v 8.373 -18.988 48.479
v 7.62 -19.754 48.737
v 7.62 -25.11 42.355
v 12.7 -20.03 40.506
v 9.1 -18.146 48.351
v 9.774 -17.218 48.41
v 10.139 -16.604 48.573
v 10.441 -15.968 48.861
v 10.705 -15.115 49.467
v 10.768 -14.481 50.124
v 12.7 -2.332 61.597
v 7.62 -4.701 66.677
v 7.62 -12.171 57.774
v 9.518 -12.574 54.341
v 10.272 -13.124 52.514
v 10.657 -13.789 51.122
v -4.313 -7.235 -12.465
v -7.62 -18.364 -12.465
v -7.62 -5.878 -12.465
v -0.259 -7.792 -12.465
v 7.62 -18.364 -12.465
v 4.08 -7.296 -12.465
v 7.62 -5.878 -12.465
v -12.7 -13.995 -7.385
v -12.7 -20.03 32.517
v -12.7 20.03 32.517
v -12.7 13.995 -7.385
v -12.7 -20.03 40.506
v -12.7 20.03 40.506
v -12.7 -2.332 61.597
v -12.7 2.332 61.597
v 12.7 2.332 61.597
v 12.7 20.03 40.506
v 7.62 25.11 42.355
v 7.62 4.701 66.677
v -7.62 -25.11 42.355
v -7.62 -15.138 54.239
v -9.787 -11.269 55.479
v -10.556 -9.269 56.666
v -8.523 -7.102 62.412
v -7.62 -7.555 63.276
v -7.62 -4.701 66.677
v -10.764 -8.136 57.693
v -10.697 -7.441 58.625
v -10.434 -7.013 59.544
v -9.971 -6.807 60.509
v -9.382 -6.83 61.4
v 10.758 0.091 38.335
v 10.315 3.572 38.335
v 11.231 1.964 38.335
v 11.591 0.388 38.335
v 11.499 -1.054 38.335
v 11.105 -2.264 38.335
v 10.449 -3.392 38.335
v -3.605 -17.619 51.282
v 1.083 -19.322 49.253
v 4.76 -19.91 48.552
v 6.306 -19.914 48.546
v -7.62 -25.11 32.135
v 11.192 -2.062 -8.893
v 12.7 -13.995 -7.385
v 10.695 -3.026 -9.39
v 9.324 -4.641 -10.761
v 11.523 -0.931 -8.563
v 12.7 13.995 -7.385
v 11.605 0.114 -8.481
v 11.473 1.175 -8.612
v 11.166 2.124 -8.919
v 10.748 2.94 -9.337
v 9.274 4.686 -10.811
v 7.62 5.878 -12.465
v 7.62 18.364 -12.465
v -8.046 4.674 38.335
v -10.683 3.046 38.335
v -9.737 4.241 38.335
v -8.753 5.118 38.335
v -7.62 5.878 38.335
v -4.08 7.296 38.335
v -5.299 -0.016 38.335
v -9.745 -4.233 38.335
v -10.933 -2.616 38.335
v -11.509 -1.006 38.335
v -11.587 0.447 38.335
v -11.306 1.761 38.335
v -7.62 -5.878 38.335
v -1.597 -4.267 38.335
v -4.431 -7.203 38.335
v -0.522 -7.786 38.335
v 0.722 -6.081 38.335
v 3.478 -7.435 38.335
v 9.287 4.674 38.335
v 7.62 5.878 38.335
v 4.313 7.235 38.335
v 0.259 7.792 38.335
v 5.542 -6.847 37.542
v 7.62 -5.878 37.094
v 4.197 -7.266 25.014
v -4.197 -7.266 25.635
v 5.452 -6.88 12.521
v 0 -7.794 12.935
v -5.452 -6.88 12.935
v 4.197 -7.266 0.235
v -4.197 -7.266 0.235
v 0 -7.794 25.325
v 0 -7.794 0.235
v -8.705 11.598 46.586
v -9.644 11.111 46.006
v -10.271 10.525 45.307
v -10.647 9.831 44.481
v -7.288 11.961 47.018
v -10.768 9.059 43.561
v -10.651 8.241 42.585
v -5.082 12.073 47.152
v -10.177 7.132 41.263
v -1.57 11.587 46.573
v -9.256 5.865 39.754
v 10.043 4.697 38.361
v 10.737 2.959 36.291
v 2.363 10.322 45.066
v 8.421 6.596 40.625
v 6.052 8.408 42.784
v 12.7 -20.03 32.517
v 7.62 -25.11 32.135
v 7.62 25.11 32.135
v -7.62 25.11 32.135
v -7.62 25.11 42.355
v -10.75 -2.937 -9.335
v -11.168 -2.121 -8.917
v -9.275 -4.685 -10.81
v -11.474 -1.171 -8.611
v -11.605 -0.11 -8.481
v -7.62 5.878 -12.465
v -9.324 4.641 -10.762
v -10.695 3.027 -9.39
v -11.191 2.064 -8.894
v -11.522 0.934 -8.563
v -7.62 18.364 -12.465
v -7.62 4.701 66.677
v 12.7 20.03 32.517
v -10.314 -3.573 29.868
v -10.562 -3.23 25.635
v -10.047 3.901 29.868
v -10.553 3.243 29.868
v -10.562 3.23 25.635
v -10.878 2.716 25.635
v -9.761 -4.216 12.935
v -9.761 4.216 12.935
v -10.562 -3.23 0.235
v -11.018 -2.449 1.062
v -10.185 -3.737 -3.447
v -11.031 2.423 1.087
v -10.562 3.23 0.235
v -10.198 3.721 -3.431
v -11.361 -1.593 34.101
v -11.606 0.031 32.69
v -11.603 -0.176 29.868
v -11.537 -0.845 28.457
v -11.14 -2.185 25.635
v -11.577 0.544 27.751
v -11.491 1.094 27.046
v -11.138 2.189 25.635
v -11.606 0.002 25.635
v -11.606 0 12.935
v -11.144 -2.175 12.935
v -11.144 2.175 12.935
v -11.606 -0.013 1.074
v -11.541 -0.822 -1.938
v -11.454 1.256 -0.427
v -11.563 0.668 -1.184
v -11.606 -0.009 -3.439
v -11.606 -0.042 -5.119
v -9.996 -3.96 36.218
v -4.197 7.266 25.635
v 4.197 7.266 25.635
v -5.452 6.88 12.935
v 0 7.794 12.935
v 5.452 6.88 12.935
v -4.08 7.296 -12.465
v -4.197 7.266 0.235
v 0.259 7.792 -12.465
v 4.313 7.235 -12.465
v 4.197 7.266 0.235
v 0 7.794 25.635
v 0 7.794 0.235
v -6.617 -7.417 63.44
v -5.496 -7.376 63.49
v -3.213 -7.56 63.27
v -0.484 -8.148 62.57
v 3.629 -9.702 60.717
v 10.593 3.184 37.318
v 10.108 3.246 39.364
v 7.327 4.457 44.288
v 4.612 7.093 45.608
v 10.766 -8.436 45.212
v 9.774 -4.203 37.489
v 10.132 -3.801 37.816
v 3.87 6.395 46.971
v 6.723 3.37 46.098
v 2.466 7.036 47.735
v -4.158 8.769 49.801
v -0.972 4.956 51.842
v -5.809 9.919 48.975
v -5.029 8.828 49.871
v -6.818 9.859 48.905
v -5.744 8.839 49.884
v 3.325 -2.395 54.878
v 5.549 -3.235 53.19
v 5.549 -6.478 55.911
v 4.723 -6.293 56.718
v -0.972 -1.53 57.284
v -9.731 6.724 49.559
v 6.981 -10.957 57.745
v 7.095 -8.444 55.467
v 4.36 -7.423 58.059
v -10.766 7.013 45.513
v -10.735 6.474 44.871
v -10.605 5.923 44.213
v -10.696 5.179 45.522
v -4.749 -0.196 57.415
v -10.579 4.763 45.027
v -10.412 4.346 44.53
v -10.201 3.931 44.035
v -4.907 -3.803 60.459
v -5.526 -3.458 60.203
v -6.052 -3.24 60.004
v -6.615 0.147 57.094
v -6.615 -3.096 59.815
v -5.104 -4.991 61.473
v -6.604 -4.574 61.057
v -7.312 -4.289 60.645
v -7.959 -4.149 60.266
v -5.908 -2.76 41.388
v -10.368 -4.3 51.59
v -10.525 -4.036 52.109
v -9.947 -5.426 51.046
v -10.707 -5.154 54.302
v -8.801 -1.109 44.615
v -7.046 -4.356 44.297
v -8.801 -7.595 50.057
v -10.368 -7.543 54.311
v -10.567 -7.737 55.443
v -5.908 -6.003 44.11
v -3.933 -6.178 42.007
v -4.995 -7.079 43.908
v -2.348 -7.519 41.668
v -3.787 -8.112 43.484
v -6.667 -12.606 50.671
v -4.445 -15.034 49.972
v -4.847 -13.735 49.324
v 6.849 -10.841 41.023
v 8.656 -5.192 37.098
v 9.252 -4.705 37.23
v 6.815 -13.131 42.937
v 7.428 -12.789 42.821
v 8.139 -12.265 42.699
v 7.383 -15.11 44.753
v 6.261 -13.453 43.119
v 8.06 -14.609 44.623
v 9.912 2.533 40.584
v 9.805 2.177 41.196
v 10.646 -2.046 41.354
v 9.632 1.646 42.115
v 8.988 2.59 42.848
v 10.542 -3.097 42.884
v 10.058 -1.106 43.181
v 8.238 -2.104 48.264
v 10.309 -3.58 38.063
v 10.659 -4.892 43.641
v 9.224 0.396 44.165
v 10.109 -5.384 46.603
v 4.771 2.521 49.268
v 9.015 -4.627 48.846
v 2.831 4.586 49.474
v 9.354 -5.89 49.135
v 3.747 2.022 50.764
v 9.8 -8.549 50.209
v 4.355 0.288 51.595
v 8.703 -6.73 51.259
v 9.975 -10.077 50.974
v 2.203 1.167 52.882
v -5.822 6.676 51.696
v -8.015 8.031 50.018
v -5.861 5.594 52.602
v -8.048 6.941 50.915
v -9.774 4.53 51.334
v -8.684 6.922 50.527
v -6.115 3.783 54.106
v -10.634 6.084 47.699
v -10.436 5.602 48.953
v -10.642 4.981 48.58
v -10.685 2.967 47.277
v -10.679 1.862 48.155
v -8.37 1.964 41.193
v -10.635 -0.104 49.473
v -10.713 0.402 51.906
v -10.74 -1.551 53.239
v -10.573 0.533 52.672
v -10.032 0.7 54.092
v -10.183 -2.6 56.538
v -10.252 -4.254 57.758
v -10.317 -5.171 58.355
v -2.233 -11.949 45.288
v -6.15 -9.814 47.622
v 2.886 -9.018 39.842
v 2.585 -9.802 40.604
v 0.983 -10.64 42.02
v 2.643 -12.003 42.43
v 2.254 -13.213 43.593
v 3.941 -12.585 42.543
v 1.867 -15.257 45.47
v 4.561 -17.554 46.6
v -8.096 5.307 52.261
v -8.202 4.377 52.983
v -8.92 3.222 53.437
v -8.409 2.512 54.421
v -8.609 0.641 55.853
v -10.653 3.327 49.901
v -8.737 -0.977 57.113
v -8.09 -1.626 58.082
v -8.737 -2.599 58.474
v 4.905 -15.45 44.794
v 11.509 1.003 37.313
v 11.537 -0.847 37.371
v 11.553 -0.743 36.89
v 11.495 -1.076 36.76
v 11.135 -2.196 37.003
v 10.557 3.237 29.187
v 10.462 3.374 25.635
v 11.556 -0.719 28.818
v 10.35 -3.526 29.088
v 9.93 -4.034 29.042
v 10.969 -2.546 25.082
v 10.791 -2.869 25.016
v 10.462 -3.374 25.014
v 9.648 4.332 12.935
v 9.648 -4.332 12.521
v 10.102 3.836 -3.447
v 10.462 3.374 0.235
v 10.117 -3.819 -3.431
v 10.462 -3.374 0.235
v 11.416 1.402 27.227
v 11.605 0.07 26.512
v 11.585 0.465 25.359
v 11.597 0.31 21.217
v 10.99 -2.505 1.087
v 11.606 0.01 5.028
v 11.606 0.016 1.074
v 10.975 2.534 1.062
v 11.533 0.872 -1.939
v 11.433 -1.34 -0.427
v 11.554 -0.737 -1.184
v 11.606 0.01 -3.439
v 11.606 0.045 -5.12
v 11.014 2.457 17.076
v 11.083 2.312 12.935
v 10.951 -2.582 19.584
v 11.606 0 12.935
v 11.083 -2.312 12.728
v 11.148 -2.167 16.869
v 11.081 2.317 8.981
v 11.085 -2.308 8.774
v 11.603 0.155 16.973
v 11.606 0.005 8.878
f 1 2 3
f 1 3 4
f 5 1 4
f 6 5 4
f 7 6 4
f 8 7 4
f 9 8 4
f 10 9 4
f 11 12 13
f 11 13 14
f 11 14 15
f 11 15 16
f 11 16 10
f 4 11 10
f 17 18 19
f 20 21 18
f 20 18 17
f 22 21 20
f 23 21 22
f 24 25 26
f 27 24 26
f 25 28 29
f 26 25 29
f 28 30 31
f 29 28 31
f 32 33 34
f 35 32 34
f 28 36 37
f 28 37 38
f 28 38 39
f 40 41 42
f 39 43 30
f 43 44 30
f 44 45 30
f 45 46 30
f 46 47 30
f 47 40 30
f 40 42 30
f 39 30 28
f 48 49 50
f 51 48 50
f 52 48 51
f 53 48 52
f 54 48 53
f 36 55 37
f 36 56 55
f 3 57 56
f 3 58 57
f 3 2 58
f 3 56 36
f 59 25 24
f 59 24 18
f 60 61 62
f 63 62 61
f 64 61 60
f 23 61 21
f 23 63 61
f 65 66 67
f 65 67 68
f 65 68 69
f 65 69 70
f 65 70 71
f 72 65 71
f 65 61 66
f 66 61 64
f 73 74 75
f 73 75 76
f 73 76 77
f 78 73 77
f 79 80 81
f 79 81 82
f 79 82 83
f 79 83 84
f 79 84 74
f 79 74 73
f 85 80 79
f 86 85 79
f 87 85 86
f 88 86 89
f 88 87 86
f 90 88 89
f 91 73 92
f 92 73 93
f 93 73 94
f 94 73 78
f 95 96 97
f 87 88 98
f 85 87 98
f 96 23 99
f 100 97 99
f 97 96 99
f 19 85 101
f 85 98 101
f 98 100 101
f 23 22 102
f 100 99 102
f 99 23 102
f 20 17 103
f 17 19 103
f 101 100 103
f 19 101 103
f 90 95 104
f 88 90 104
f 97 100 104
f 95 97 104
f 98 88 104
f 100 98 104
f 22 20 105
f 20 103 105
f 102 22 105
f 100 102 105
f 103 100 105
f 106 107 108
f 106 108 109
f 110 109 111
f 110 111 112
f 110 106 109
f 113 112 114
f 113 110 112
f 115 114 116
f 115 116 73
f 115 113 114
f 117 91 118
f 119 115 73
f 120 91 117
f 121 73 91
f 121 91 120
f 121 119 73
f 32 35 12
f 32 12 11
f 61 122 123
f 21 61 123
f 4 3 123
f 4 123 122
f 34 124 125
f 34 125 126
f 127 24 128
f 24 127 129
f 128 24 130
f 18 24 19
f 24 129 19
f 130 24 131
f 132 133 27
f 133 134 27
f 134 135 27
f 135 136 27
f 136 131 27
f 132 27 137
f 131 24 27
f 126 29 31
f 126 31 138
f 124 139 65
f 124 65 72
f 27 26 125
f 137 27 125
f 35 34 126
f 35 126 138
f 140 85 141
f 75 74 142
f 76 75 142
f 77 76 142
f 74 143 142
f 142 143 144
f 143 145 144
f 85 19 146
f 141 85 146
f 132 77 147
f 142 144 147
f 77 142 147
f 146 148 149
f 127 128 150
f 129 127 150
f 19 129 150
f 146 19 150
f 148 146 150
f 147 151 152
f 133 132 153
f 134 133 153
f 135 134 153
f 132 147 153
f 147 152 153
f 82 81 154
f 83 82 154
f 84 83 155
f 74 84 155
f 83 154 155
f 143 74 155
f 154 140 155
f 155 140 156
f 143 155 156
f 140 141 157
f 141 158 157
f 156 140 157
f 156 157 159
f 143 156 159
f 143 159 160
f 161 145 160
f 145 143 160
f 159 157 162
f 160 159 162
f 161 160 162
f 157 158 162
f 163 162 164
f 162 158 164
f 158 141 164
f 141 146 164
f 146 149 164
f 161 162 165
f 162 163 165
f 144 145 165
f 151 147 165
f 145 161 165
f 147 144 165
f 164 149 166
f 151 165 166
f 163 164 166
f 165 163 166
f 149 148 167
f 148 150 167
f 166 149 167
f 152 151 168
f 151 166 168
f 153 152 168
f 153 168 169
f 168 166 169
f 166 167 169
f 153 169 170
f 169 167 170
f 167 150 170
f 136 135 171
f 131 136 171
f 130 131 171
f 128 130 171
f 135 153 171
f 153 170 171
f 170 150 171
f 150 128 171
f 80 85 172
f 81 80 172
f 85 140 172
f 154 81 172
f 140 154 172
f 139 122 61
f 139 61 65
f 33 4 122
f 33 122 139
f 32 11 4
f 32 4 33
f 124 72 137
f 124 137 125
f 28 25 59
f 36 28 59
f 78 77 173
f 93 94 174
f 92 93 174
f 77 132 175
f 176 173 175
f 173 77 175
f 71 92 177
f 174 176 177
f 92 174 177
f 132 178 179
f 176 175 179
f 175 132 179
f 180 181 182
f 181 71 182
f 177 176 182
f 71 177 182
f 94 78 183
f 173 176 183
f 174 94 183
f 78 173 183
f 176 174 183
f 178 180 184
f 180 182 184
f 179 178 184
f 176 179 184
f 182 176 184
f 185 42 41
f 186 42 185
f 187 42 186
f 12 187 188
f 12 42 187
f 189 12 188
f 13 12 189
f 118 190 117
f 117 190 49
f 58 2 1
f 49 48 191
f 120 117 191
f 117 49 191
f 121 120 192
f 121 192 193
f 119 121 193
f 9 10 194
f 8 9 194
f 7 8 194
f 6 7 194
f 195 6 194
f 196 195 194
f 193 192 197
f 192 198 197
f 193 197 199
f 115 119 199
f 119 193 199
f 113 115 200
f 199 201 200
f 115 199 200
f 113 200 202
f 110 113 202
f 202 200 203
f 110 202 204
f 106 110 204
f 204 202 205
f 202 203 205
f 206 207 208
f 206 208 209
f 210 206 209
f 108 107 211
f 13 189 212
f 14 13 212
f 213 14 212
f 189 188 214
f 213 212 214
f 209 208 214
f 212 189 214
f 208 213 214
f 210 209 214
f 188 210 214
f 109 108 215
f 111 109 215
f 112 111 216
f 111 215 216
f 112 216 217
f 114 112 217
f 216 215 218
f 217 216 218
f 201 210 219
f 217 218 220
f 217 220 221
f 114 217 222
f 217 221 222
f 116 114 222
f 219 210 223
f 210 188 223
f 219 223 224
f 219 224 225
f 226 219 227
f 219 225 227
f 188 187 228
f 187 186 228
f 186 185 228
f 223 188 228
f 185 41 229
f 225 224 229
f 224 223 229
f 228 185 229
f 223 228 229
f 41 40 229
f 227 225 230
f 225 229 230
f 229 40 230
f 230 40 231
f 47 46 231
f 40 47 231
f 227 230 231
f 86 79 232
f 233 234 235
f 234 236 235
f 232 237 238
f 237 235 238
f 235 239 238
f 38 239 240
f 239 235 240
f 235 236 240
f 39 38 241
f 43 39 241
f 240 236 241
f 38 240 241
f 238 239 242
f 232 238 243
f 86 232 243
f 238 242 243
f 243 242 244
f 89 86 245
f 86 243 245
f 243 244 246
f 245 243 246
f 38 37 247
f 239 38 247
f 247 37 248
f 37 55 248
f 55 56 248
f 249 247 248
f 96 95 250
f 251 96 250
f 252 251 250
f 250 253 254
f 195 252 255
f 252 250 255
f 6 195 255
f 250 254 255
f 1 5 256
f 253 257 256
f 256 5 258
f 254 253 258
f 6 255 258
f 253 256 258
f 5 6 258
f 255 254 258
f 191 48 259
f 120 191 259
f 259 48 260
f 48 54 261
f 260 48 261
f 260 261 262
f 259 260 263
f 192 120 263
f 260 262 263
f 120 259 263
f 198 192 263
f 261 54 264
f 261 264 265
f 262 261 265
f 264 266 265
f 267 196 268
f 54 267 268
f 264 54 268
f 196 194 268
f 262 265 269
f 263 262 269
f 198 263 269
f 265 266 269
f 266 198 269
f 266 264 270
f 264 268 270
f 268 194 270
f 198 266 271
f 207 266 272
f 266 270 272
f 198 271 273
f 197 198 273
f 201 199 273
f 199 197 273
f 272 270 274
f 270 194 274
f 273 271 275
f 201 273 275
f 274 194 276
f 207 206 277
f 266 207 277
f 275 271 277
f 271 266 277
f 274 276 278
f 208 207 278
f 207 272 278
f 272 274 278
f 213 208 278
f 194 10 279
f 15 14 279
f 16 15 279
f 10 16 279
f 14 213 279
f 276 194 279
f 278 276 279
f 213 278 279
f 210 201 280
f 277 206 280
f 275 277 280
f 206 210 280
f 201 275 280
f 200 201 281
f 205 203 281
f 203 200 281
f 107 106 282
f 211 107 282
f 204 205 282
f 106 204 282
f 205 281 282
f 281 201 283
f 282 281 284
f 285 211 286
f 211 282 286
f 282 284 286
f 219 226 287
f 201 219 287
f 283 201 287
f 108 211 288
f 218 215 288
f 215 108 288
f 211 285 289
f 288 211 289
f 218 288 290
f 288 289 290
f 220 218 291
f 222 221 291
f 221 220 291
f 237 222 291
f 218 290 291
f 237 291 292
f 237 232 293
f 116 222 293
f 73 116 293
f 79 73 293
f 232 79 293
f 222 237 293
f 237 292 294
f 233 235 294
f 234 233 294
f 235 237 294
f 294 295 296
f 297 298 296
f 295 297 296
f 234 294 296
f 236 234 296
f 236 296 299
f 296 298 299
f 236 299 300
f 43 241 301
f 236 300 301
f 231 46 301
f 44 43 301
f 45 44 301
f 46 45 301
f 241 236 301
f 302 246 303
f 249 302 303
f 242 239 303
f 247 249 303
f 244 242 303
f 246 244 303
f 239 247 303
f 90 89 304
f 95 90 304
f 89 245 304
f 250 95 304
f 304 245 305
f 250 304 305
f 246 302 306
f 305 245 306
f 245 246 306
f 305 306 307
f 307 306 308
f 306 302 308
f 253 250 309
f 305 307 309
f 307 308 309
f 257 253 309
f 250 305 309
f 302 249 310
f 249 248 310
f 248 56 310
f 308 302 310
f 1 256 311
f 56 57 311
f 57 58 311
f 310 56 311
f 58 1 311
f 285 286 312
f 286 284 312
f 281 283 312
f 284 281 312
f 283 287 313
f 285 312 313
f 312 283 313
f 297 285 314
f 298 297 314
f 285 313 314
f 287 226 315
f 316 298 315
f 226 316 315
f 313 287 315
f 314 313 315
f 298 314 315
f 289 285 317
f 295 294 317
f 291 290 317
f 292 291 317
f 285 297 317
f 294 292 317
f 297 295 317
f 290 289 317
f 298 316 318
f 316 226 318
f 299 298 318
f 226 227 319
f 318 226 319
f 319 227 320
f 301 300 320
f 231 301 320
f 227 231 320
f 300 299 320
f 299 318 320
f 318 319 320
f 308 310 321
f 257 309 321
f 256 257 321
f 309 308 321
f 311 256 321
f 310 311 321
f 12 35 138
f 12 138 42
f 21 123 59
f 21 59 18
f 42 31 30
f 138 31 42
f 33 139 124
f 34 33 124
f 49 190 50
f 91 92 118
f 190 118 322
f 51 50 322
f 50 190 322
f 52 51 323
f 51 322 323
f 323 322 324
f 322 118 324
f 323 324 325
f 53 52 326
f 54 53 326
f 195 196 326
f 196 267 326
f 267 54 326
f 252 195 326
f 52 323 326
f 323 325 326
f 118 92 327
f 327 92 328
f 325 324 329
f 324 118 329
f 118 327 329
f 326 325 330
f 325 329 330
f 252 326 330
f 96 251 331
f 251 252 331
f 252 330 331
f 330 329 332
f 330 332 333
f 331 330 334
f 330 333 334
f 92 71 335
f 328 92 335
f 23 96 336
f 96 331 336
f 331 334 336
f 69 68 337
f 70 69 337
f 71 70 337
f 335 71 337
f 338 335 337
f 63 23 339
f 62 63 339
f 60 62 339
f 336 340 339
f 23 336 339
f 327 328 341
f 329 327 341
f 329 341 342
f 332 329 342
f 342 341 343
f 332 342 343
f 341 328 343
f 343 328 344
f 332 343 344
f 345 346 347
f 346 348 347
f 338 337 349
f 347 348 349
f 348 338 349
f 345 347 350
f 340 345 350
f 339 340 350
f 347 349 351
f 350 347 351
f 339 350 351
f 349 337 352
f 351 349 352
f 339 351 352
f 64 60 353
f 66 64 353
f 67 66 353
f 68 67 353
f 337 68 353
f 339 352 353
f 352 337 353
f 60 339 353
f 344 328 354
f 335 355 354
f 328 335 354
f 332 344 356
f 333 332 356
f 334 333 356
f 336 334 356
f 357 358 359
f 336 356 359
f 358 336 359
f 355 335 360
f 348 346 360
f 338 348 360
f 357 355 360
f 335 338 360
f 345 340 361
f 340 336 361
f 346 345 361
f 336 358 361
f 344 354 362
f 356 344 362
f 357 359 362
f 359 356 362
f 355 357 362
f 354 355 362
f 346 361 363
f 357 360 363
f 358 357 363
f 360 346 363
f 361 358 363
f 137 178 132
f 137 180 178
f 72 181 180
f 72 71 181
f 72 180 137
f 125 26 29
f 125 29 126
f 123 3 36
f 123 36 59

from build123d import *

# Parameters (mm, degrees)
F1_DEPTH     = 12.7
F3_DEPTH     = 25.4
F4_T1_DEPTH  = 57.8782991577
F4_T3_DEPTH  = 62.476485972
F4_T5_DEPTH  = 97.3641990785
F4_T7_DEPTH  = 35.5309018222
F4_T9_DEPTH  = 57.8782991577
F4_T11_DEPTH = 97.3641990785
F4_T13_DEPTH = 62.8567289608
F6_DEPTH     = 50.8


# Not quite as in the source:
# - a fillet or chamfer that OpenCascade refuses, or shapes differently, is made with other operations: its cross-section is extruded or revolved along the edge and cut away or added


with BuildPart() as f1:
    # F0 (on Right) → F1 (new body, symmetric)
    with BuildSketch(Plane.YZ):
        Polygon((-4.7013013323, 66.6768401792), (-25.1098079398, 42.3549291102), (-25.1098079398, 32.1350414537), (-18.3642149015, -12.4653242528), (0, -12.4653242528), (18.3642149015, -12.4653242528), (25.1098079398, 32.1350414537), (25.1098079398, 42.3549291102), (4.7013013323, 66.6768401792), (0, 66.6768401792), align=None)
    extrude(amount=F1_DEPTH, both=True)

    # F2 (on face) → F3 (cut)
    with BuildSketch(Plane(origin=(0, -35.5907714481, 29.8642031954), x_dir=(1, 0, 0), z_dir=(0, -0.7660444431, 0.6427876097))):
        with BuildLine():
            add(Edge.make_bspline(
                [(9.7735087186, 26.016607844), (17.6021152344, 35.4512603932), (-0.9724511014, 42.8986037189), (-19.5470174373, 50.3459470446), (-8.8010576172, 33.4639511697), (1.9449022029, 16.5819552948), (9.7735087186, 26.016607844)],
                knots=[0, 0, 0, 2.0943951024, 2.0943951024, 4.1887902048, 4.1887902048, 6.2831853072, 6.2831853072, 6.2831853072], degree=2, weights=[1, 0.5, 1, 0.5, 1, 0.5, 1]))
        make_face()
    extrude(amount=-F3_DEPTH, mode=Mode.SUBTRACT)

    # F4: chamfer of 5.08 on 16 edges, made by hand

    # F4_s2 → F4_t1 (cut)
    with BuildSketch(Plane(origin=(0, 39.2869435962, 46.8203561728), x_dir=(1, 0, 0), z_dir=(0, -0.6427876097, -0.7660444431))):
        Polygon((7.62, 46.4604524813), (12.7, 41.3804524813), (12.7, 46.4604524813), align=None)
        Polygon((-7.62, 46.4604524813), (-12.7, 41.3804524813), (-12.7, 46.4604524813), align=None)
    extrude(amount=F4_T1_DEPTH, mode=Mode.SUBTRACT)

    # F4_s4 → F4_t3 (cut)
    with BuildSketch(Plane.XY.offset(-7.0574072829)):
        Polygon((7.62, -25.1098079398), (12.7, -20.0298079398), (12.7, -25.1098079398), align=None)
        Polygon((12.7, 20.0298079398), (7.62, 25.1098079398), (12.7, 25.1098079398), align=None)
        Polygon((-12.7, 20.0298079398), (-7.62, 25.1098079398), (-12.7, 25.1098079398), align=None)
        Polygon((-12.7, -20.0298079398), (-7.62, -25.1098079398), (-12.7, -25.1098079398), align=None)
    extrude(amount=F4_T3_DEPTH, mode=Mode.SUBTRACT)

    # F4_s6 → F4_t5 (cut)
    with BuildSketch(Plane(origin=(0, -11.1741383172, 73.8809253053), x_dir=(1, 0, 0), z_dir=(0, 0.1495444875, -0.9887549981))):
        Polygon((12.7, 14.9418297969), (7.62, 20.0218297969), (12.7, 20.0218297969), align=None)
        Polygon((-12.7, 14.9418297969), (-7.62, 20.0218297969), (-12.7, 20.0218297969), align=None)
    extrude(amount=F4_T5_DEPTH, mode=Mode.SUBTRACT)

    # F4_s8 → F4_t7 (cut)
    with BuildSketch(Plane.XZ.offset(-17.7654509111)):
        Polygon((7.62, 66.6768401792), (12.7, 61.5968401792), (12.7, 66.6768401792), align=None)
        Polygon((-12.7, 61.5968401792), (-7.62, 66.6768401792), (-12.7, 66.6768401792), align=None)
    extrude(amount=F4_T7_DEPTH, mode=Mode.SUBTRACT)

    # F4_s10 → F4_t9 (cut)
    with BuildSketch(Plane(origin=(0, -2.0834900279, 2.4830067258), x_dir=(1, 0, 0), z_dir=(0, -0.6427876097, 0.7660444431))):
        Polygon((12.7, 41.3804524813), (7.62, 46.4604524813), (12.7, 46.4604524813), align=None)
        Polygon((-12.7, 41.3804524813), (-7.62, 46.4604524813), (-12.7, 46.4604524813), align=None)
    extrude(amount=F4_T9_DEPTH, mode=Mode.SUBTRACT)

    # F4_s12 → F4_t11 (cut)
    with BuildSketch(Plane(origin=(0, -3.3861409345, -22.3884131691), x_dir=(1, 0, 0), z_dir=(0, 0.1495444875, 0.9887549981))):
        Polygon((12.7, 14.9418297969), (7.62, 20.0218297969), (12.7, 20.0218297969), align=None)
        Polygon((-12.7, 14.9418297969), (-7.62, 20.0218297969), (-12.7, 20.0218297969), align=None)
    extrude(amount=F4_T11_DEPTH, mode=Mode.SUBTRACT)

    # F4_s14 → F4_t13 (cut)
    with BuildSketch(Plane.XZ.offset(-31.4283644804)):
        Polygon((12.7, -7.3853242528), (7.62, -12.4653242528), (12.7, -12.4653242528), align=None)
        Polygon((-12.7, -7.3853242528), (-7.62, -12.4653242528), (-12.7, -12.4653242528), align=None)
    extrude(amount=F4_T13_DEPTH, mode=Mode.SUBTRACT)

    # F5 (on face) → F6 (cut)
    with BuildSketch(Plane(origin=(0, 0, -12.4653242528), x_dir=(1, 0, 0), z_dir=(0, 0, -1))):
        with BuildLine():
            Line((-7.62, 5.8784427825), (-7.62, -5.8784427825))
            add(Edge.make_bspline(
                [(-7.62, -5.8784427825), (0, -10.3327032159), (7.62, -5.8784427825)],
                knots=[0.8545345114, 0.8545345114, 0.8545345114, 2.2870581422, 2.2870581422, 2.2870581422], degree=2, weights=[1, 0.7542653721, 1]))
            Line((7.62, -5.8784427825), (7.62, 5.8784427825))
            add(Edge.make_bspline(
                [(7.62, 5.8784427825), (0, 10.3327032159), (-7.62, 5.8784427825)],
                knots=[3.9961271649, 3.9961271649, 3.9961271649, 5.4286507958, 5.4286507958, 5.4286507958], degree=2, weights=[1, 0.7542653721, 1]))
        make_face()
        with BuildLine():
            add(Edge.make_bspline(
                [(-7.62, 5.8784427825), (-11.6057749838, 3.5485635427), (-11.6057749838, 0)],
                knots=[5.4286507958, 5.4286507958, 5.4286507958, 6.2831853072, 6.2831853072, 6.2831853072], degree=2, weights=[1, 0.9101015555, 1]))
            add(Edge.make_bspline(
                [(-11.6057749838, 0), (-11.6057749838, -3.5485635427), (-7.62, -5.8784427825)],
                knots=[0, 0, 0, 0.8545345114, 0.8545345114, 0.8545345114], degree=2, weights=[1, 0.9101015555, 1]))
            Line((-7.62, -5.8784427825), (-7.62, 5.8784427825))
        make_face()
        with BuildLine():
            Line((7.62, 5.8784427825), (7.62, -5.8784427825))
            add(Edge.make_bspline(
                [(7.62, -5.8784427825), (17.6763796553, 0), (7.62, 5.8784427825)],
                knots=[2.2870581422, 2.2870581422, 2.2870581422, 3.9961271649, 3.9961271649, 3.9961271649], degree=2, weights=[1, 0.6565696828, 1]))
        make_face()
    extrude(amount=-F6_DEPTH, mode=Mode.SUBTRACT)


solid = f1.part
